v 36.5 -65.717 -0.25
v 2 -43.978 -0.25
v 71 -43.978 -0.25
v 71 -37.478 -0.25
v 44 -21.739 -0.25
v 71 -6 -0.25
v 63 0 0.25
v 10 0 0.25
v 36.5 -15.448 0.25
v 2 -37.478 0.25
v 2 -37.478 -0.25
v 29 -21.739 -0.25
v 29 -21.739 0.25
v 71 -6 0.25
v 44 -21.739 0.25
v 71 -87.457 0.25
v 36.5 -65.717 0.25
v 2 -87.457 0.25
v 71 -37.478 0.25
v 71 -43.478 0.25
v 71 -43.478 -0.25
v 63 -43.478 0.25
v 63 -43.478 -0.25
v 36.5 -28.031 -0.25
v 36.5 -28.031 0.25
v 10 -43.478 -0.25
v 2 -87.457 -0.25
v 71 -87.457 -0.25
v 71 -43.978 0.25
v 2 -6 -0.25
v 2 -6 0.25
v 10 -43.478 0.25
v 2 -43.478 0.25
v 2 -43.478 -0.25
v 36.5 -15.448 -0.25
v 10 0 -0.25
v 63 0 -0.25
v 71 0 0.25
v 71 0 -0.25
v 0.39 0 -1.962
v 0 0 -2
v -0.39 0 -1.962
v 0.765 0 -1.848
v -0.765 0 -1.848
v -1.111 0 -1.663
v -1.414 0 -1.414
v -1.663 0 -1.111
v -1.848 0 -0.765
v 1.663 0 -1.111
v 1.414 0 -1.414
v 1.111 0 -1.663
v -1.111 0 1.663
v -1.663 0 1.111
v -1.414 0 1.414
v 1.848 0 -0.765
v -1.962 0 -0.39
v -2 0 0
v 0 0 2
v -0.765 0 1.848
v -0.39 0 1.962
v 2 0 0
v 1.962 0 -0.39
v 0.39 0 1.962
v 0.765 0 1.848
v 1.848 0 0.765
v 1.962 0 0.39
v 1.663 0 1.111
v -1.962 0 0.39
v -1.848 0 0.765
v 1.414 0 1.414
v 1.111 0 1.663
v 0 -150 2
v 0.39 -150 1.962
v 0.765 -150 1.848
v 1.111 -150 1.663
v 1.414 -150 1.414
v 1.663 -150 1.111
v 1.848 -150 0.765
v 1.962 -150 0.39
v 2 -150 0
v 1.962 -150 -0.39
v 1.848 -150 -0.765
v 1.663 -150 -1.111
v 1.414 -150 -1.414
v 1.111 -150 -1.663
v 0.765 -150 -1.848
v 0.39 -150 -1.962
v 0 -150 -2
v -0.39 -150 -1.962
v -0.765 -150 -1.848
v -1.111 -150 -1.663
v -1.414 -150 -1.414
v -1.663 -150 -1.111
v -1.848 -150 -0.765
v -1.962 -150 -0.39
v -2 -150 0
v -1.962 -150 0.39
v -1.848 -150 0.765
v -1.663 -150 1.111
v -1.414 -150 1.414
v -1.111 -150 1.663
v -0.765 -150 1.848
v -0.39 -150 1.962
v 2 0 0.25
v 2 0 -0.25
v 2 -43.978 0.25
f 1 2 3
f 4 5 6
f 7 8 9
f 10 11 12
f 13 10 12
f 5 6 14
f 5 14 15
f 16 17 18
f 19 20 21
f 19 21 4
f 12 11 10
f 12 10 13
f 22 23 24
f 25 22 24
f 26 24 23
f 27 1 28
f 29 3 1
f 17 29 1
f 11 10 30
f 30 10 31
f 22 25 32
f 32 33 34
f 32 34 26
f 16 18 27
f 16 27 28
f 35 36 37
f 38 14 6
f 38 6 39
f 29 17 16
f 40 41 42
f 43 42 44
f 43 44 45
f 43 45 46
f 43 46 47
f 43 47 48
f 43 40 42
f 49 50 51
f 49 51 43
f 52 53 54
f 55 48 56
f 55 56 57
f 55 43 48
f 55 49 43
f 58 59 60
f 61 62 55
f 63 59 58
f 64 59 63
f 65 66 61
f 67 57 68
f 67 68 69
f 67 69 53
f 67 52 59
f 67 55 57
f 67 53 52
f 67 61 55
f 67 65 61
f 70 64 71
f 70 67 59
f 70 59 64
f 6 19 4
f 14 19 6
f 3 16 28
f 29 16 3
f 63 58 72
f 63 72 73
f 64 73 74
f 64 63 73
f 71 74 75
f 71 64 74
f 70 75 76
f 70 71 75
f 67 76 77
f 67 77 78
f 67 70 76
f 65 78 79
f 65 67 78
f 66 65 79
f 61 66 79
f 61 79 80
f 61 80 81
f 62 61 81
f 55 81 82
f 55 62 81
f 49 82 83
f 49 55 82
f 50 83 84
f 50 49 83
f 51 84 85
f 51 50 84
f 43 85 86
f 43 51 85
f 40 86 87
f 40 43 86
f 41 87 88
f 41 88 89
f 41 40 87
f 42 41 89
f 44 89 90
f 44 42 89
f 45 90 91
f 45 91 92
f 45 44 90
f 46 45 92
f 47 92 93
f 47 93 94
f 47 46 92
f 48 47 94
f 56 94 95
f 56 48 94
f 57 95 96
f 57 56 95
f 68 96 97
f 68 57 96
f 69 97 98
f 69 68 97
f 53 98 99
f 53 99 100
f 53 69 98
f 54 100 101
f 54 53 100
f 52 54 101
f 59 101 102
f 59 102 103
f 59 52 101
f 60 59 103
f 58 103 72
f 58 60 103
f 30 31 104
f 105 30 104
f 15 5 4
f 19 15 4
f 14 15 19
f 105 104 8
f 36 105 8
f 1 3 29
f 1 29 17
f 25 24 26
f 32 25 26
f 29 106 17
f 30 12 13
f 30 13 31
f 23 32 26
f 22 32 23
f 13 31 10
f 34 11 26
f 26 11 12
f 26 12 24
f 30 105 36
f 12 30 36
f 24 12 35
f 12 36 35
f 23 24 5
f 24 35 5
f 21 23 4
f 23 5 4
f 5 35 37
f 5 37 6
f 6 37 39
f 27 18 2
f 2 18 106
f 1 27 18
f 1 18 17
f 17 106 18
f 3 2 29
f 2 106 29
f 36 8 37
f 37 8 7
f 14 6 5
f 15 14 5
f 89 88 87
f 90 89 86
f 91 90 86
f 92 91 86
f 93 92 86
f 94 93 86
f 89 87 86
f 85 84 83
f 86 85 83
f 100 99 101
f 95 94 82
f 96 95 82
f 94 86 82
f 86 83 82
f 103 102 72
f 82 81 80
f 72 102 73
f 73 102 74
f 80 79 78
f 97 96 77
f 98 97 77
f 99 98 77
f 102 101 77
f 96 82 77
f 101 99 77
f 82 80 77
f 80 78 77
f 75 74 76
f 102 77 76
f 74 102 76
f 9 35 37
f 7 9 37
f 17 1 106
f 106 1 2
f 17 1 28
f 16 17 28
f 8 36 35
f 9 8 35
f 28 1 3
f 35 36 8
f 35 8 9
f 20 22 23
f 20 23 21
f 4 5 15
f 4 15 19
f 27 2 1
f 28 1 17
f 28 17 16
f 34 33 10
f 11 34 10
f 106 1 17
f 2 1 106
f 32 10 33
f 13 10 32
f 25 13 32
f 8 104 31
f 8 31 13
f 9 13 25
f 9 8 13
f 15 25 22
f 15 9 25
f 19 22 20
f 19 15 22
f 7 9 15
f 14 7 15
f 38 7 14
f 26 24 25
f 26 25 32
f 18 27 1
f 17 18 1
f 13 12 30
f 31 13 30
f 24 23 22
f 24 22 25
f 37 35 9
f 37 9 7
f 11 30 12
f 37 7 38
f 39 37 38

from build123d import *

# Parameters (mm, degrees)
ESQUISSE2_W                  = 69
ESQUISSE2_H                  = 43.47826087
BOSS_EXTRU_2_DEPTH           = 0.25
ESQUISSE2_H_2                = 43.478260869
BOSS_EXTRU_2_2_DEPTH         = 0.25
ESQUISSE3_R                  = 2
BOSS_EXTRU_3_DEPTH           = 150
FRACTIONNER1_SURFACE_1_BACK  = 167.868
FRACTIONNER1_SURFACE_1_DEPTH = 335.736
FRACTIONNER1_SURFACE_2_BACK  = 167.868
FRACTIONNER1_SURFACE_2_DEPTH = 335.736
FRACTIONNER2_SURFACE_3_BACK  = 167.868
FRACTIONNER2_SURFACE_3_DEPTH = 335.736
FRACTIONNER2_SURFACE_4_BACK  = 167.868
FRACTIONNER2_SURFACE_4_DEPTH = 335.736
FRACTIONNER3_SURFACE_5_BACK  = 167.868
FRACTIONNER3_SURFACE_5_DEPTH = 335.736
FRACTIONNER3_SURFACE_6_BACK  = 167.868
FRACTIONNER3_SURFACE_6_DEPTH = 335.736


with BuildPart() as part:
    # Esquisse2 → Boss.-Extru.2 (new, symmetric)
    with BuildSketch(Plane.XY):
        with Locations((36.5, -21.739130435)):
            Rectangle(ESQUISSE2_W, ESQUISSE2_H)
    extrude(amount=BOSS_EXTRU_2_DEPTH, both=True)


with BuildPart() as body_2:
    # Esquisse2 → Boss.-Extru.2 2 (new, symmetric)
    with BuildSketch(Plane.XY):
        with Locations((36.5, -65.717391305)):
            Rectangle(ESQUISSE2_W, ESQUISSE2_H_2)
    extrude(amount=BOSS_EXTRU_2_2_DEPTH, both=True)


with BuildPart() as body_3:
    # Esquisse3 → Boss.-Extru.3 (new body)
    with BuildSketch(Plane(origin=(0, 0, 0), x_dir=(1, 0, 0), z_dir=(0, 1, 0))):
        with Locations(Location((0, 0, 0), (0, 0, 270))):
            Circle(ESQUISSE3_R)
    extrude(amount=-BOSS_EXTRU_3_DEPTH)


with BuildPart() as body_4:
    # Fractionner1: the piece behind the surface
    add(part.part)
    # Fractionner1 surface: a surface, the sketch's curves swept straight by 335.736 mm
    with BuildLine(Plane.XY.offset(0.25).offset(-FRACTIONNER1_SURFACE_1_BACK), mode=Mode.PRIVATE) as fractionner1_surface_1_path:
        Line((10, 0), (36.5, -15.447665056))
        Line((36.5, -15.447665056), (63, 0))
        Line((63, 0), (71, 0))
        Line((71, 0), (71, -6))
        Line((71, -6), (44, -21.739130435))
        Line((44, -21.739130435), (71, -37.47826087))
        Line((71, -37.47826087), (71, -43.47826087))
        Line((71, -43.47826087), (63, -43.47826087))
        Line((63, -43.47826087), (36.5, -28.030595813))
        Line((36.5, -28.030595813), (10, -43.47826087))
        Line((10, -43.47826087), (2, -43.47826087))
        Line((2, -43.47826087), (2, -37.47826087))
        Line((2, -37.47826087), (29, -21.739130435))
        Line((29, -21.739130435), (2, -6))
        Line((2, -6), (2, 0))
        Line((2, 0), (10, 0))
    fractionner1_surface_1 = Shell.extrude(fractionner1_surface_1_path.wire(), (0 * FRACTIONNER1_SURFACE_1_DEPTH, 0 * FRACTIONNER1_SURFACE_1_DEPTH, 1 * FRACTIONNER1_SURFACE_1_DEPTH))
    split(bisect_by=fractionner1_surface_1, keep=Keep.BOTTOM)


with BuildPart() as part_1:
    add(part.part)

    # Fractionner1: split by a surface, the side it looks to stays
    # Fractionner1 surface: a surface, the sketch's curves swept straight by 335.736 mm
    with BuildLine(Plane.XY.offset(0.25).offset(-FRACTIONNER1_SURFACE_2_BACK), mode=Mode.PRIVATE) as fractionner1_surface_2_path:
        Line((10, 0), (36.5, -15.447665056))
        Line((36.5, -15.447665056), (63, 0))
        Line((63, 0), (71, 0))
        Line((71, 0), (71, -6))
        Line((71, -6), (44, -21.739130435))
        Line((44, -21.739130435), (71, -37.47826087))
        Line((71, -37.47826087), (71, -43.47826087))
        Line((71, -43.47826087), (63, -43.47826087))
        Line((63, -43.47826087), (36.5, -28.030595813))
        Line((36.5, -28.030595813), (10, -43.47826087))
        Line((10, -43.47826087), (2, -43.47826087))
        Line((2, -43.47826087), (2, -37.47826087))
        Line((2, -37.47826087), (29, -21.739130435))
        Line((29, -21.739130435), (2, -6))
        Line((2, -6), (2, 0))
        Line((2, 0), (10, 0))
    fractionner1_surface_2 = Shell.extrude(fractionner1_surface_2_path.wire(), (0 * FRACTIONNER1_SURFACE_2_DEPTH, 0 * FRACTIONNER1_SURFACE_2_DEPTH, 1 * FRACTIONNER1_SURFACE_2_DEPTH))
    split(bisect_by=fractionner1_surface_2, keep=Keep.TOP)


with BuildPart() as body_5:
    # Fractionner2: the piece behind the surface
    add(body_2.part)
    # Fractionner2 surface: a surface, the sketch's curves swept straight by 335.736 mm
    with BuildLine(Plane.XY.offset(0.25).offset(-FRACTIONNER2_SURFACE_3_BACK), mode=Mode.PRIVATE) as fractionner2_surface_3_path:
        Line((2, -43.97826087), (71, -43.97826087))
        Line((71, -43.97826087), (36.5, -65.717391304))
        Line((36.5, -65.717391304), (2, -43.97826087))
    fractionner2_surface_3 = Shell.extrude(fractionner2_surface_3_path.wire(), (0 * FRACTIONNER2_SURFACE_3_DEPTH, 0 * FRACTIONNER2_SURFACE_3_DEPTH, 1 * FRACTIONNER2_SURFACE_3_DEPTH))
    split(bisect_by=fractionner2_surface_3, keep=Keep.BOTTOM)


with BuildPart() as body_2_1:
    add(body_2.part)

    # Fractionner2: split by a surface, the side it looks to stays
    # Fractionner2 surface: a surface, the sketch's curves swept straight by 335.736 mm
    with BuildLine(Plane.XY.offset(0.25).offset(-FRACTIONNER2_SURFACE_4_BACK), mode=Mode.PRIVATE) as fractionner2_surface_4_path:
        Line((2, -43.97826087), (71, -43.97826087))
        Line((71, -43.97826087), (36.5, -65.717391304))
        Line((36.5, -65.717391304), (2, -43.97826087))
    fractionner2_surface_4 = Shell.extrude(fractionner2_surface_4_path.wire(), (0 * FRACTIONNER2_SURFACE_4_DEPTH, 0 * FRACTIONNER2_SURFACE_4_DEPTH, 1 * FRACTIONNER2_SURFACE_4_DEPTH))
    split(bisect_by=fractionner2_surface_4, keep=Keep.TOP)


with BuildPart() as body_6:
    # Fractionner3: the piece behind the surface
    add(body_2_1.part)
    # Fractionner3 surface: a surface, the sketch's curves swept straight by 335.736 mm
    with BuildLine(Plane.XY.offset(0.25).offset(-FRACTIONNER3_SURFACE_5_BACK), mode=Mode.PRIVATE) as fractionner3_surface_5_path:
        Line((2, -87.456521739), (36.5, -65.717391304))
        Line((36.5, -65.717391304), (71, -87.456521739))
        Line((71, -87.456521739), (2, -87.456521739))
    fractionner3_surface_5 = Shell.extrude(fractionner3_surface_5_path.wire(), (0 * FRACTIONNER3_SURFACE_5_DEPTH, 0 * FRACTIONNER3_SURFACE_5_DEPTH, 1 * FRACTIONNER3_SURFACE_5_DEPTH))
    split(bisect_by=fractionner3_surface_5, keep=Keep.BOTTOM)


with BuildPart() as body_2_2:
    add(body_2_1.part)

    # Fractionner3: split by a surface, the side it looks to stays
    # Fractionner3 surface: a surface, the sketch's curves swept straight by 335.736 mm
    with BuildLine(Plane.XY.offset(0.25).offset(-FRACTIONNER3_SURFACE_6_BACK), mode=Mode.PRIVATE) as fractionner3_surface_6_path:
        Line((2, -87.456521739), (36.5, -65.717391304))
        Line((36.5, -65.717391304), (71, -87.456521739))
        Line((71, -87.456521739), (2, -87.456521739))
    fractionner3_surface_6 = Shell.extrude(fractionner3_surface_6_path.wire(), (0 * FRACTIONNER3_SURFACE_6_DEPTH, 0 * FRACTIONNER3_SURFACE_6_DEPTH, 1 * FRACTIONNER3_SURFACE_6_DEPTH))
    split(bisect_by=fractionner3_surface_6, keep=Keep.TOP)


solid = Compound([body_3.part, body_4.part, part_1.part, body_5.part, body_6.part, body_2_2.part])
